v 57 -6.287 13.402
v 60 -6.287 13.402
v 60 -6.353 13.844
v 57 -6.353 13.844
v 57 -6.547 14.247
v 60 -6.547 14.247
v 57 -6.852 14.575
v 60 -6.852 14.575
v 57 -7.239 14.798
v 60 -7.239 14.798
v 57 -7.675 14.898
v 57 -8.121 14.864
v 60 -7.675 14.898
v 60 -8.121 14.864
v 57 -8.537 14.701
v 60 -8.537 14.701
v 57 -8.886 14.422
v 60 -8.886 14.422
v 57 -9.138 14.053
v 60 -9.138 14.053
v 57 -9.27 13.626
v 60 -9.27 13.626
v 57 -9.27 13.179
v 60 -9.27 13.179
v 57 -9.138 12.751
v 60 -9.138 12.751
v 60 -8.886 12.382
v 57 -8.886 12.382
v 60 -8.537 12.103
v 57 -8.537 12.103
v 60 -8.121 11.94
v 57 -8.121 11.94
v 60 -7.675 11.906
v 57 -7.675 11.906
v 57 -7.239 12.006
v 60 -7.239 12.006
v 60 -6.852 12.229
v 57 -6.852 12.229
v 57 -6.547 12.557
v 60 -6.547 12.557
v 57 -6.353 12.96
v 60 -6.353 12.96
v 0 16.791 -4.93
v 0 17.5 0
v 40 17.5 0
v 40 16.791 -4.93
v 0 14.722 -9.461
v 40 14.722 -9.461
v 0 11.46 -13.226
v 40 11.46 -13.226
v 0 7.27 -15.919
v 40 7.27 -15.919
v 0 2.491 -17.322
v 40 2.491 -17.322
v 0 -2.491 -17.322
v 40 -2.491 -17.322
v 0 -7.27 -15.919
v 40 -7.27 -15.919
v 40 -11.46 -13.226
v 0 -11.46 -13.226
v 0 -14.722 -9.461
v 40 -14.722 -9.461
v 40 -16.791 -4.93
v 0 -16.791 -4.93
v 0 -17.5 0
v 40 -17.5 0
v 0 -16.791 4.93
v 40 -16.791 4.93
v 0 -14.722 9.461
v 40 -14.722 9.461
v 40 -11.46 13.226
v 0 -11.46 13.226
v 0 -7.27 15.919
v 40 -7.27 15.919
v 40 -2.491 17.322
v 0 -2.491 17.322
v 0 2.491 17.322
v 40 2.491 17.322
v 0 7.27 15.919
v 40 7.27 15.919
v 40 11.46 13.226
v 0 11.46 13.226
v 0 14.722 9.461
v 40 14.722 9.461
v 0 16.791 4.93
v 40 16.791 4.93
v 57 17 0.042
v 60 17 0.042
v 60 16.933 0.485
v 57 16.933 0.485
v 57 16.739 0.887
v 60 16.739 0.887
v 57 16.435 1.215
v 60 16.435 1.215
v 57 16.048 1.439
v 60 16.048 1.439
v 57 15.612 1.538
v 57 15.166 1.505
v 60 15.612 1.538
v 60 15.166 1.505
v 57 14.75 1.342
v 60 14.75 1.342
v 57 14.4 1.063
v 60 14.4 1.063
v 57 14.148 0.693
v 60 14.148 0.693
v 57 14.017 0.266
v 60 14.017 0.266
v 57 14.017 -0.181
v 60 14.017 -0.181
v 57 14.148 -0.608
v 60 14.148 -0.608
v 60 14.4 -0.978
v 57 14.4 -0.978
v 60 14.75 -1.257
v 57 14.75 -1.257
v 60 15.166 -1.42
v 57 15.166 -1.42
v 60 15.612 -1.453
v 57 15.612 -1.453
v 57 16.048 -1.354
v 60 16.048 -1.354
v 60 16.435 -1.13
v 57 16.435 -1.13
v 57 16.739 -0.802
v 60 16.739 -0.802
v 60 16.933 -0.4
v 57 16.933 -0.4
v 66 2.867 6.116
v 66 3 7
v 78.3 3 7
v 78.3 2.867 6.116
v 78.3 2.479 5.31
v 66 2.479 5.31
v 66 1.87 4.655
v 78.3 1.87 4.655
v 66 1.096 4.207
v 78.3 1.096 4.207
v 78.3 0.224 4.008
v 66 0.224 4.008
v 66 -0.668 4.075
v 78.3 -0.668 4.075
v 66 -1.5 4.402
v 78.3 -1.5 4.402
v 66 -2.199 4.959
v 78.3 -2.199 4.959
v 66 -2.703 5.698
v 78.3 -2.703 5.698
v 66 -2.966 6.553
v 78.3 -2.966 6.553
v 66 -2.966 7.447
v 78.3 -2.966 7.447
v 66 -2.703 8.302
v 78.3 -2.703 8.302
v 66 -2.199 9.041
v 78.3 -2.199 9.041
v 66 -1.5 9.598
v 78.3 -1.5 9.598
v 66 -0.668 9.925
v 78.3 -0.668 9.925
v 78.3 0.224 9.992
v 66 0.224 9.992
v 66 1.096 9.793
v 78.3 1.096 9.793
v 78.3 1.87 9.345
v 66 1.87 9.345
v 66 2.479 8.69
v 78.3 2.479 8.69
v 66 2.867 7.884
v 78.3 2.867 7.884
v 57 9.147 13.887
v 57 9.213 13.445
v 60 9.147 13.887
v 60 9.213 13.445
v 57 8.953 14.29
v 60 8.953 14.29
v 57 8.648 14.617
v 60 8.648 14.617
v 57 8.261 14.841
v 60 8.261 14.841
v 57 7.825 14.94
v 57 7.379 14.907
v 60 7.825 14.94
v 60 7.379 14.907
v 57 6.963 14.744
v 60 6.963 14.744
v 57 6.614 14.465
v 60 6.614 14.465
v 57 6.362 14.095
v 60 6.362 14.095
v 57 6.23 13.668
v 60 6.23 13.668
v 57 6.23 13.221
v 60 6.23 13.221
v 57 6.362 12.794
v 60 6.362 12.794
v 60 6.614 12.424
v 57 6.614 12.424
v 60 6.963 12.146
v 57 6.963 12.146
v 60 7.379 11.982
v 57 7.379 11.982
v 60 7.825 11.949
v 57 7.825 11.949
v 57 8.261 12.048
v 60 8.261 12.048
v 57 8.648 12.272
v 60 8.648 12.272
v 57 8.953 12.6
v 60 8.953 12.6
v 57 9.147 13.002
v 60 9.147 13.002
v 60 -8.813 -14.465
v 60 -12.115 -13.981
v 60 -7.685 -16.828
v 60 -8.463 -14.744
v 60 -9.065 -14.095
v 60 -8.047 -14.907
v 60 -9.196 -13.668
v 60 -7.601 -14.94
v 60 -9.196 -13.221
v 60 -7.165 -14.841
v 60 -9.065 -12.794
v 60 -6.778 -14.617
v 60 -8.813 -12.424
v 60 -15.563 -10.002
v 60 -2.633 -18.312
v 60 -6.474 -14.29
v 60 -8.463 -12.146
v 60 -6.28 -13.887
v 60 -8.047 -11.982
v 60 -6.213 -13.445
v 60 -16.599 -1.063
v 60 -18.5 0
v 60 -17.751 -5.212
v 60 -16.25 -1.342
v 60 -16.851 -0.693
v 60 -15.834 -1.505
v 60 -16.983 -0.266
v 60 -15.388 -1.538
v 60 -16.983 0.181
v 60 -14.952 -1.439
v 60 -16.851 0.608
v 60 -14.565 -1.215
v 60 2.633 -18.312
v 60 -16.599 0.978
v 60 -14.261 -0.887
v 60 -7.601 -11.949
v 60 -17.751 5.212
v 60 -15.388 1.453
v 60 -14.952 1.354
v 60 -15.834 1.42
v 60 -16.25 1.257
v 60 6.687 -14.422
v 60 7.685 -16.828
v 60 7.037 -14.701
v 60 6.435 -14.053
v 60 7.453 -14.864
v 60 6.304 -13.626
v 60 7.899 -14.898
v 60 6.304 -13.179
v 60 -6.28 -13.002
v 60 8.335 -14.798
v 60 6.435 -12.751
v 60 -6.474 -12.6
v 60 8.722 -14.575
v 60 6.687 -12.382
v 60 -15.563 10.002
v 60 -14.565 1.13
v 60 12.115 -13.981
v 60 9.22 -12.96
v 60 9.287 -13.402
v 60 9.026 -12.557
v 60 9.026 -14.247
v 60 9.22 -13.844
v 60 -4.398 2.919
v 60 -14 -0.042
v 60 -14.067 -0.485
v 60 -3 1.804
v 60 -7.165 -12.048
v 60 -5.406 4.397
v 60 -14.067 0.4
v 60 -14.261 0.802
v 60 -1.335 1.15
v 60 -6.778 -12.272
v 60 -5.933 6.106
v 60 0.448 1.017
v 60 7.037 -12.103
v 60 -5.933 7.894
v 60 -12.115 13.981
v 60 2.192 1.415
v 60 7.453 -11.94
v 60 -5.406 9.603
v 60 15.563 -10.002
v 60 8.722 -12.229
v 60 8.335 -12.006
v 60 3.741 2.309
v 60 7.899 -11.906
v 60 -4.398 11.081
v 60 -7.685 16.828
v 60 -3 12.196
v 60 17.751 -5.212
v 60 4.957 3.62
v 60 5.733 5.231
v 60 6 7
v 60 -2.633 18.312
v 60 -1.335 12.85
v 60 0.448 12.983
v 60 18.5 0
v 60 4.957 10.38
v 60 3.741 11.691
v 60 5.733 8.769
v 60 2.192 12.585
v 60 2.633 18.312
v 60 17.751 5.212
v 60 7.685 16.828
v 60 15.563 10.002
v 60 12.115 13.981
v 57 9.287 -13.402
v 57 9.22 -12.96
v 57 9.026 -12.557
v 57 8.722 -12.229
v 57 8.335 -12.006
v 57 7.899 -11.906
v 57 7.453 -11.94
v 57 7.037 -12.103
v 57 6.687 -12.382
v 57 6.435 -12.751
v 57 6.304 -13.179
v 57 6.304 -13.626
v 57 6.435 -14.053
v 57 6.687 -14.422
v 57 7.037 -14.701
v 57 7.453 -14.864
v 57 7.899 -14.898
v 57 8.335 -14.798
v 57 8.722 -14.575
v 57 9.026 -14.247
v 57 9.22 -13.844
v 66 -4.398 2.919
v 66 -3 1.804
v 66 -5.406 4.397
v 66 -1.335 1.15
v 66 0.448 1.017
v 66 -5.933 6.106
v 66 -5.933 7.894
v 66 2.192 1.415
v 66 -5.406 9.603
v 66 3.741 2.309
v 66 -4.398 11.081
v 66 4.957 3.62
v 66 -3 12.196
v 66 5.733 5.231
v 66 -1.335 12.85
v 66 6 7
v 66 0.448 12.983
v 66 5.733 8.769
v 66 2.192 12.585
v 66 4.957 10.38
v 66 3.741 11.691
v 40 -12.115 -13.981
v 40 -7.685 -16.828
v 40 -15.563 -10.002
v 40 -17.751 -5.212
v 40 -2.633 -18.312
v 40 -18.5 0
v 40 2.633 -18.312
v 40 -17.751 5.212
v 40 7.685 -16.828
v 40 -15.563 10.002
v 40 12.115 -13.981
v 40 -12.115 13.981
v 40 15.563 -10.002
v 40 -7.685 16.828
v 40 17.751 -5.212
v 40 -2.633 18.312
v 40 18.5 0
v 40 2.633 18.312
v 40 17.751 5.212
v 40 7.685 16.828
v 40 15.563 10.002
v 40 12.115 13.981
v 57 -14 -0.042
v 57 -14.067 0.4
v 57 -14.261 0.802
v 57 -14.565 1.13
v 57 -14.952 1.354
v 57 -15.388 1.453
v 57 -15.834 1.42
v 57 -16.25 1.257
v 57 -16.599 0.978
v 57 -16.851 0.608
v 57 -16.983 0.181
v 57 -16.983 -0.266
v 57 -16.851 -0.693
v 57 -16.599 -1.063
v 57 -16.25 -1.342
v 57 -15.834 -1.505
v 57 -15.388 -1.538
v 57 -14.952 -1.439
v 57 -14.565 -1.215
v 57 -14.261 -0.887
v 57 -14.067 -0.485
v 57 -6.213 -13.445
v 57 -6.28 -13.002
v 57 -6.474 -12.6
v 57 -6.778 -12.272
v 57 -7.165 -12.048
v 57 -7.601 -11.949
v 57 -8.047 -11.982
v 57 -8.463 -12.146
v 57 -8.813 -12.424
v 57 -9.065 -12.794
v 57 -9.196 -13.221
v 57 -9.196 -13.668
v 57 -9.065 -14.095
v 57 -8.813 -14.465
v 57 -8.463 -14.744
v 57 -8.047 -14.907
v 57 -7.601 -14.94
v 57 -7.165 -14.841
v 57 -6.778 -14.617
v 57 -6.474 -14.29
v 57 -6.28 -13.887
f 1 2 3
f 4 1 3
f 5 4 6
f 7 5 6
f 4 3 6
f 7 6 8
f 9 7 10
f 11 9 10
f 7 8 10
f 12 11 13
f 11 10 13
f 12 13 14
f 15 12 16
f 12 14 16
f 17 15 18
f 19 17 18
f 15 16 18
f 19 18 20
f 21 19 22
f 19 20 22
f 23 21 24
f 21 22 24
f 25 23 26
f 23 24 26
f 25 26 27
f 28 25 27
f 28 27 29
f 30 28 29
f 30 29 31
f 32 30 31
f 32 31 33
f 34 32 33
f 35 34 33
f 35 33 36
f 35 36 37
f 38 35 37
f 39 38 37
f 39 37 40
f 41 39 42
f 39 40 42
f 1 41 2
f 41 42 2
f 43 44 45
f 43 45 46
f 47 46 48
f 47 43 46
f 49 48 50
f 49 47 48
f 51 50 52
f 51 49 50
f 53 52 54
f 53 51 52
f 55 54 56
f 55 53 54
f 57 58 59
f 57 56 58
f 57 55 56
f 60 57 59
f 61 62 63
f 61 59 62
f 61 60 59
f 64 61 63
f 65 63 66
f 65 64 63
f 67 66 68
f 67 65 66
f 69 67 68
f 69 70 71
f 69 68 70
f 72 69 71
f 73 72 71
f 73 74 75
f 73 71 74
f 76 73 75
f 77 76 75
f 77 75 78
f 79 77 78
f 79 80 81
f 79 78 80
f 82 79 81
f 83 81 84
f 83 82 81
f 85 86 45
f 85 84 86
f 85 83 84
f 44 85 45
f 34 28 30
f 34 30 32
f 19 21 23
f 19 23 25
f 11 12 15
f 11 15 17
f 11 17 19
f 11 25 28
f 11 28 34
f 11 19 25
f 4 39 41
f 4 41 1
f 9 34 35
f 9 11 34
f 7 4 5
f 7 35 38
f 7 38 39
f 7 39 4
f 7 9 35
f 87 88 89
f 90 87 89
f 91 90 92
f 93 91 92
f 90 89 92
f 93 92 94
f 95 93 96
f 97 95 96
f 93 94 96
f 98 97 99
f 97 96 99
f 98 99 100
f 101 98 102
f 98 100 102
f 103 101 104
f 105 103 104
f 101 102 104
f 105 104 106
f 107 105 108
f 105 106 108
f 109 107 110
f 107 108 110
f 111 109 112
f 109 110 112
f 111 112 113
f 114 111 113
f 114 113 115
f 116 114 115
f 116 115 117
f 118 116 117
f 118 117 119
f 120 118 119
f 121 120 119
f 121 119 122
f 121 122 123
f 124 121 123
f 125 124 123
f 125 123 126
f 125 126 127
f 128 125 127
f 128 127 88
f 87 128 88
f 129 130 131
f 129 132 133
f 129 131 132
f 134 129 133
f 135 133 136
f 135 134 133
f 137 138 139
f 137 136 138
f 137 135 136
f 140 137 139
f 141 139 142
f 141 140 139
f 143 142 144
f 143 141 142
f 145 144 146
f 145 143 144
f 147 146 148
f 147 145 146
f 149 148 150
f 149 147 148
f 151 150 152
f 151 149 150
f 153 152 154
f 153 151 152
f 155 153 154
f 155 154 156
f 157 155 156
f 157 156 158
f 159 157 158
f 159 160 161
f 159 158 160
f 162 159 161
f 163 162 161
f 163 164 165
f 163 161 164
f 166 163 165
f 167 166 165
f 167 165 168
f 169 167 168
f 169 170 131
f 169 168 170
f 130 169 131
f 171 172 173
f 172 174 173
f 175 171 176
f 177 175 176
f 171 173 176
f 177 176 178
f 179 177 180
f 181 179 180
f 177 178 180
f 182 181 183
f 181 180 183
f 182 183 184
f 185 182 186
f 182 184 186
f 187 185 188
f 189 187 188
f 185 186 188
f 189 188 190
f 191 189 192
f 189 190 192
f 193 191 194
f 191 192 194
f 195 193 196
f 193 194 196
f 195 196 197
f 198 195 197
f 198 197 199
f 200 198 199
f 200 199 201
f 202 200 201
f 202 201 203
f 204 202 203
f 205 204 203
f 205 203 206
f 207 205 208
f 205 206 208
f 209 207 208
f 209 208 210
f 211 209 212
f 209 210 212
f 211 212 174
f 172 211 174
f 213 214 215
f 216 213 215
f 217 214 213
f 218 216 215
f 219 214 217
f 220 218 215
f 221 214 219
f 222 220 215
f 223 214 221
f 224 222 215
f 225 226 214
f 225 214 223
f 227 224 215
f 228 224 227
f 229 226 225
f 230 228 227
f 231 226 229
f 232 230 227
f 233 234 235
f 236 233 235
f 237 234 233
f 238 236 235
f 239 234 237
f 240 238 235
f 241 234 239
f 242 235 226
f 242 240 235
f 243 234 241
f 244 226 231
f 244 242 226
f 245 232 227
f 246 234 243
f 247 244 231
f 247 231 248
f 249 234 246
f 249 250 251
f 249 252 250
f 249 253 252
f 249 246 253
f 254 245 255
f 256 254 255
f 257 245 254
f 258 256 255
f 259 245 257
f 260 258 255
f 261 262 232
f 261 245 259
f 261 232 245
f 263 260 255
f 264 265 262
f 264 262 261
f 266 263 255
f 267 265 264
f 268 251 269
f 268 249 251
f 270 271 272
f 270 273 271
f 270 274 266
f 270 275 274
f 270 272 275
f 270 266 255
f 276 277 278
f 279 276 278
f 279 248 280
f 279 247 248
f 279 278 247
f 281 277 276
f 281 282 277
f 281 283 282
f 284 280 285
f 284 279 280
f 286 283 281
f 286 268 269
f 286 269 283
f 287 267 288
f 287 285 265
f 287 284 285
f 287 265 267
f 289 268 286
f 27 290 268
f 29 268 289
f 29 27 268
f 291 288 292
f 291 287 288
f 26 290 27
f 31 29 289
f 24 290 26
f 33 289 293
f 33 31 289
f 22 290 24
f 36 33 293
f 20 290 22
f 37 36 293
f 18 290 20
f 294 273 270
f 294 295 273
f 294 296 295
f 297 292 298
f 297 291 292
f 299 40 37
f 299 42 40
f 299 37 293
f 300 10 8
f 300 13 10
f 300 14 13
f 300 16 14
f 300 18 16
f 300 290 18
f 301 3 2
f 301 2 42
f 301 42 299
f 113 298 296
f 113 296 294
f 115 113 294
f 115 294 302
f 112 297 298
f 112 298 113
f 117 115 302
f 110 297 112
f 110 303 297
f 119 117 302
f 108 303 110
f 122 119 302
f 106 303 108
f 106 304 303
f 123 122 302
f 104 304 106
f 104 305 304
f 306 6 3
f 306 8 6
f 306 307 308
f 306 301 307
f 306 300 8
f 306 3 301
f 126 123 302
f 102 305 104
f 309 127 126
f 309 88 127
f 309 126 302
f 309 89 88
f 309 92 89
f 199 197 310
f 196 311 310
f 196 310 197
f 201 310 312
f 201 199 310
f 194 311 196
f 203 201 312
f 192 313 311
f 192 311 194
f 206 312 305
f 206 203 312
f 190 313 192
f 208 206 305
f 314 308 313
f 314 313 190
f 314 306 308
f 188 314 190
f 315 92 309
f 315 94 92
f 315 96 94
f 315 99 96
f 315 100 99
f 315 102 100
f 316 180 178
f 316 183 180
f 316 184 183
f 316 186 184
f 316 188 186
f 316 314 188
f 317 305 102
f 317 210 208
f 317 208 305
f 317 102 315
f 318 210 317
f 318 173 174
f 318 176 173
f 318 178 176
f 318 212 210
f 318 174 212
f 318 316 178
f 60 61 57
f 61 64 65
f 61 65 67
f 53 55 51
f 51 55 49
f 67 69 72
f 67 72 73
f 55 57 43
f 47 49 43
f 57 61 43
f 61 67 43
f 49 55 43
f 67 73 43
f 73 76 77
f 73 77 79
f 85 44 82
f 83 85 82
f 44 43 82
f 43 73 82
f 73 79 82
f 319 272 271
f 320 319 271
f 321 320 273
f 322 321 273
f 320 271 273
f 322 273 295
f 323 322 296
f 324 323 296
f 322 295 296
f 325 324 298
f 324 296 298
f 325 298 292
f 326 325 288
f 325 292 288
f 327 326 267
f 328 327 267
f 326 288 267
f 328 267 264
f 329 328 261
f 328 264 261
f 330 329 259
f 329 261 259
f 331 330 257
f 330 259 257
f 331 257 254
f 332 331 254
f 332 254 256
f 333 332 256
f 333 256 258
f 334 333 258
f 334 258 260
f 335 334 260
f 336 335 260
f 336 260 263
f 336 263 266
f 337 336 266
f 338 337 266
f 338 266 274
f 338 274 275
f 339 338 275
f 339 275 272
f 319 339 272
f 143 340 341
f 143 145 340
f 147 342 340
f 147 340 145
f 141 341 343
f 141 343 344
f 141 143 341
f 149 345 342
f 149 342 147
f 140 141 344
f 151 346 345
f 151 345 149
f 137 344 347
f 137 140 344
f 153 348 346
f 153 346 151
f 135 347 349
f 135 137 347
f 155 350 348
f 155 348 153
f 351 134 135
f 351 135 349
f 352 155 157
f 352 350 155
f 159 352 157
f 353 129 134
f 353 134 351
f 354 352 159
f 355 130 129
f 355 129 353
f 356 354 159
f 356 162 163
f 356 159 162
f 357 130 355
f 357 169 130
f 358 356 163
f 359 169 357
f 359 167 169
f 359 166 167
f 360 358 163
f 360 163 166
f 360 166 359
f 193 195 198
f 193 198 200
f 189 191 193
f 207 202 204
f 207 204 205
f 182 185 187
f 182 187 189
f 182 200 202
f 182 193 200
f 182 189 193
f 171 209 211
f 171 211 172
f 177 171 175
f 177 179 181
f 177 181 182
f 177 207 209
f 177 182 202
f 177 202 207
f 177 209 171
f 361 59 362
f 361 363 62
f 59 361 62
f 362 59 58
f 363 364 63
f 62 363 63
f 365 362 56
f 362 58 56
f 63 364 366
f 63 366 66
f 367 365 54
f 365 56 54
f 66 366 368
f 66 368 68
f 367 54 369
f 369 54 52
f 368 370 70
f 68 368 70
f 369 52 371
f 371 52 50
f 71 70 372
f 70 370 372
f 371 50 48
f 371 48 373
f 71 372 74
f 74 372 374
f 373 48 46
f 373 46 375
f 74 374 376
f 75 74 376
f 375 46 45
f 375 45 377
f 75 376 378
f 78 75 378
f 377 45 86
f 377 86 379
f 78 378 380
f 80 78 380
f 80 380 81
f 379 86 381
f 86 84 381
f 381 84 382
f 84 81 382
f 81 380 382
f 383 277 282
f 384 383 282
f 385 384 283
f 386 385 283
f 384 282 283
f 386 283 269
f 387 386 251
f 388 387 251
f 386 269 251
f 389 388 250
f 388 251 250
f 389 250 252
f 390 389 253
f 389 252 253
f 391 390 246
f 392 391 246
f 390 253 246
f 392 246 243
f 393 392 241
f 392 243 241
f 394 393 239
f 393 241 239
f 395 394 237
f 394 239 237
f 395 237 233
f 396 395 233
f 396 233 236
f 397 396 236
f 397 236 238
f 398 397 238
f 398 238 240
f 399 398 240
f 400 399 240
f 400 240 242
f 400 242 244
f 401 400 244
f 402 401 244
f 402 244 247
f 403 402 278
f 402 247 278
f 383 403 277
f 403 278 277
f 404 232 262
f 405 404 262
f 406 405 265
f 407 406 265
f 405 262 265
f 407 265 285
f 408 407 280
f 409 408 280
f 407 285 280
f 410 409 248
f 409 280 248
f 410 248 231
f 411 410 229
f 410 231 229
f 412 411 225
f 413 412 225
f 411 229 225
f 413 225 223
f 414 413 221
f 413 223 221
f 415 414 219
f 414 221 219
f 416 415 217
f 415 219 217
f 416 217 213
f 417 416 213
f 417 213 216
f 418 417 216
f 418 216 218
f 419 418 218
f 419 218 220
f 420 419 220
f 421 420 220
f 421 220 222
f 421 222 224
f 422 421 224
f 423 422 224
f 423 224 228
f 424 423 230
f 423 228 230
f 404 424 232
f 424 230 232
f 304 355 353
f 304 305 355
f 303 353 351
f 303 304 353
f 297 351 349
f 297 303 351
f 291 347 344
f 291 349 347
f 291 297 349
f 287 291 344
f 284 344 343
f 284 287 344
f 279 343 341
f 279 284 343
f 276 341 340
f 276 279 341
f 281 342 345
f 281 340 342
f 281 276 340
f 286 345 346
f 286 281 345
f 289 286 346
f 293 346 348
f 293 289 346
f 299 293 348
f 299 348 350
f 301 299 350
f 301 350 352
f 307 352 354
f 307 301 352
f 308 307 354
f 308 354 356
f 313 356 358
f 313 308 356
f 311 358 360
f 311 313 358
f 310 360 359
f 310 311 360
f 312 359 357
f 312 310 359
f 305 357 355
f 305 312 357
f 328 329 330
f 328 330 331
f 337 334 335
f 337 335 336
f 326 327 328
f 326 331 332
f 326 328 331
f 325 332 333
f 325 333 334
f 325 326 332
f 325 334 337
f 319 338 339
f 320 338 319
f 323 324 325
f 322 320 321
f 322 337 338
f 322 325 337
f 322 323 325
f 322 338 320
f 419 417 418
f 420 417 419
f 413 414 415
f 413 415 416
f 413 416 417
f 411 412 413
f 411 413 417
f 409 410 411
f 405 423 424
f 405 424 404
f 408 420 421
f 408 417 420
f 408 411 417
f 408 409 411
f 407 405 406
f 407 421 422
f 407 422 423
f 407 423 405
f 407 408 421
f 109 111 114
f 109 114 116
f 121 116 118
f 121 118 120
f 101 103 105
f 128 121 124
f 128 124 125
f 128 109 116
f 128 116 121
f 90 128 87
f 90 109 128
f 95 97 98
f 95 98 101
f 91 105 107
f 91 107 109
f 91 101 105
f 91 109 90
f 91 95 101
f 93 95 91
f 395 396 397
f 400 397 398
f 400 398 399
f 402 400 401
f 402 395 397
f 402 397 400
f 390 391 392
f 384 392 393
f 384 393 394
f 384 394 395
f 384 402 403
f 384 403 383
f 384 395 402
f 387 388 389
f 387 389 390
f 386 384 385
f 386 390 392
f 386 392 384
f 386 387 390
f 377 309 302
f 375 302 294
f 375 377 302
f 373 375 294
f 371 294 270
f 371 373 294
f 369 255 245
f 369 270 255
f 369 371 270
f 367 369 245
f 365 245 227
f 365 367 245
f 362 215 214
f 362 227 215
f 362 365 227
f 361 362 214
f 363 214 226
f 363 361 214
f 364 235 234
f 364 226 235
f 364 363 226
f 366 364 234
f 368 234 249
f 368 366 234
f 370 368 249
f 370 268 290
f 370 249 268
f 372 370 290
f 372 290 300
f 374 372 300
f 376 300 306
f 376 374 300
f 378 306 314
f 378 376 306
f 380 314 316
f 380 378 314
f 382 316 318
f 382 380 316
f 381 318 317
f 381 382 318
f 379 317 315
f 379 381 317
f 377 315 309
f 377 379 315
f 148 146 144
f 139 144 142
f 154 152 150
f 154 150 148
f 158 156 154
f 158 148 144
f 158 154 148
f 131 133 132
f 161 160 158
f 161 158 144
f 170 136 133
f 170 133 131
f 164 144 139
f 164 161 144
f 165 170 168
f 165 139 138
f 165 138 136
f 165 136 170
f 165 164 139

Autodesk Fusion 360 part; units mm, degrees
sketch "Sketch1" plane through (0, 0, 0) normal (1, 0, 0) x (0, 1, 0)
  circle A0 centre (0, 0) radius 17.5
  line L0 (0, 0) -> (0, 17.5)
  dimension "d1" = 35
extrude "Extrude1" add sketch "Sketch1" along normal blind 40
sketch "Sketch2" plane through (40, 0, 0) normal (1, 0, 0) x (0, 1, 0)
  circle A0 centre (0, 0) radius 17.5
  circle A1 centre (0, 0) radius 18.5
  point P0 (0, 7)
  dimension "d5" = 37
extrude "Extrude2" add sketch "Sketch2" along normal blind 20 contours A0 | A1
sketch "Sketch3" plane through (60, 0, 0) normal (1, 0, 0) x (0, 1, 0)
  circle A0 centre (0, 0) radius 18.5
  line L0 (0, 0) -> (0, 7)
  circle A1 centre (0, 7) radius 6
  circle A2 centre (0, 0) radius 15.5 construction
  line L1 (0, 0) -> (0, 15.5)
  circle A3 centre (-15.4999, -0.0425) radius 1.5
  circle A4 centre (-7.7132, -13.4446) radius 1.5
  circle A5 centre (7.7868, -13.4021) radius 1.5
  circle A6 centre (15.4999, 0.0425) radius 1.5
  circle A7 centre (7.7132, 13.4446) radius 1.5
  circle A8 centre (-7.7868, 13.4021) radius 1.5
  dimension "d8" = 12
  dimension "d9" = 31
  dimension "d10" = 3
  dimension "d12" = 360
extrude "Extrude3" cut sketch "Sketch3" against normal blind 3 contours A3 | A4 | A5 | A6 | A7 | A8
sketch "Sketch4" plane through (60, 0, 0) normal (1, 0, 0) x (0, 1, 0)
  circle A0 centre (7.7868, -13.4021) radius 1.5
  circle A1 centre (-7.7868, 13.4021) radius 1.5
  circle A2 centre (15.4999, 0.0425) radius 1.5
  circle A3 centre (-7.7132, -13.4446) radius 1.5
  circle A4 centre (-15.4999, -0.0425) radius 1.5
  circle A5 centre (7.7132, 13.4446) radius 1.5
  circle A6 centre (0, 0) radius 18.5
  circle A7 centre (0, 0) radius 18.5
  line L0 (0, 0) -> (0, 7) construction
  circle A8 centre (0, 7) radius 6
  dimension "d15" = 37
  dimension "d16" = 7
  dimension "d17" = 12
extrude "Extrude4" add sketch "Sketch4" along normal blind 6 contours A8
sketch "Sketch6" plane through (66, 0, 0) normal (1, 0, 0) x (0, 1, 0)
  circle A0 centre (0, 7) radius 6
  circle A1 centre (0, 7) radius 3
  dimension "d21" = 6
extrude "Extrude5" add sketch "Sketch6" along normal blind 12.3 contours A1
